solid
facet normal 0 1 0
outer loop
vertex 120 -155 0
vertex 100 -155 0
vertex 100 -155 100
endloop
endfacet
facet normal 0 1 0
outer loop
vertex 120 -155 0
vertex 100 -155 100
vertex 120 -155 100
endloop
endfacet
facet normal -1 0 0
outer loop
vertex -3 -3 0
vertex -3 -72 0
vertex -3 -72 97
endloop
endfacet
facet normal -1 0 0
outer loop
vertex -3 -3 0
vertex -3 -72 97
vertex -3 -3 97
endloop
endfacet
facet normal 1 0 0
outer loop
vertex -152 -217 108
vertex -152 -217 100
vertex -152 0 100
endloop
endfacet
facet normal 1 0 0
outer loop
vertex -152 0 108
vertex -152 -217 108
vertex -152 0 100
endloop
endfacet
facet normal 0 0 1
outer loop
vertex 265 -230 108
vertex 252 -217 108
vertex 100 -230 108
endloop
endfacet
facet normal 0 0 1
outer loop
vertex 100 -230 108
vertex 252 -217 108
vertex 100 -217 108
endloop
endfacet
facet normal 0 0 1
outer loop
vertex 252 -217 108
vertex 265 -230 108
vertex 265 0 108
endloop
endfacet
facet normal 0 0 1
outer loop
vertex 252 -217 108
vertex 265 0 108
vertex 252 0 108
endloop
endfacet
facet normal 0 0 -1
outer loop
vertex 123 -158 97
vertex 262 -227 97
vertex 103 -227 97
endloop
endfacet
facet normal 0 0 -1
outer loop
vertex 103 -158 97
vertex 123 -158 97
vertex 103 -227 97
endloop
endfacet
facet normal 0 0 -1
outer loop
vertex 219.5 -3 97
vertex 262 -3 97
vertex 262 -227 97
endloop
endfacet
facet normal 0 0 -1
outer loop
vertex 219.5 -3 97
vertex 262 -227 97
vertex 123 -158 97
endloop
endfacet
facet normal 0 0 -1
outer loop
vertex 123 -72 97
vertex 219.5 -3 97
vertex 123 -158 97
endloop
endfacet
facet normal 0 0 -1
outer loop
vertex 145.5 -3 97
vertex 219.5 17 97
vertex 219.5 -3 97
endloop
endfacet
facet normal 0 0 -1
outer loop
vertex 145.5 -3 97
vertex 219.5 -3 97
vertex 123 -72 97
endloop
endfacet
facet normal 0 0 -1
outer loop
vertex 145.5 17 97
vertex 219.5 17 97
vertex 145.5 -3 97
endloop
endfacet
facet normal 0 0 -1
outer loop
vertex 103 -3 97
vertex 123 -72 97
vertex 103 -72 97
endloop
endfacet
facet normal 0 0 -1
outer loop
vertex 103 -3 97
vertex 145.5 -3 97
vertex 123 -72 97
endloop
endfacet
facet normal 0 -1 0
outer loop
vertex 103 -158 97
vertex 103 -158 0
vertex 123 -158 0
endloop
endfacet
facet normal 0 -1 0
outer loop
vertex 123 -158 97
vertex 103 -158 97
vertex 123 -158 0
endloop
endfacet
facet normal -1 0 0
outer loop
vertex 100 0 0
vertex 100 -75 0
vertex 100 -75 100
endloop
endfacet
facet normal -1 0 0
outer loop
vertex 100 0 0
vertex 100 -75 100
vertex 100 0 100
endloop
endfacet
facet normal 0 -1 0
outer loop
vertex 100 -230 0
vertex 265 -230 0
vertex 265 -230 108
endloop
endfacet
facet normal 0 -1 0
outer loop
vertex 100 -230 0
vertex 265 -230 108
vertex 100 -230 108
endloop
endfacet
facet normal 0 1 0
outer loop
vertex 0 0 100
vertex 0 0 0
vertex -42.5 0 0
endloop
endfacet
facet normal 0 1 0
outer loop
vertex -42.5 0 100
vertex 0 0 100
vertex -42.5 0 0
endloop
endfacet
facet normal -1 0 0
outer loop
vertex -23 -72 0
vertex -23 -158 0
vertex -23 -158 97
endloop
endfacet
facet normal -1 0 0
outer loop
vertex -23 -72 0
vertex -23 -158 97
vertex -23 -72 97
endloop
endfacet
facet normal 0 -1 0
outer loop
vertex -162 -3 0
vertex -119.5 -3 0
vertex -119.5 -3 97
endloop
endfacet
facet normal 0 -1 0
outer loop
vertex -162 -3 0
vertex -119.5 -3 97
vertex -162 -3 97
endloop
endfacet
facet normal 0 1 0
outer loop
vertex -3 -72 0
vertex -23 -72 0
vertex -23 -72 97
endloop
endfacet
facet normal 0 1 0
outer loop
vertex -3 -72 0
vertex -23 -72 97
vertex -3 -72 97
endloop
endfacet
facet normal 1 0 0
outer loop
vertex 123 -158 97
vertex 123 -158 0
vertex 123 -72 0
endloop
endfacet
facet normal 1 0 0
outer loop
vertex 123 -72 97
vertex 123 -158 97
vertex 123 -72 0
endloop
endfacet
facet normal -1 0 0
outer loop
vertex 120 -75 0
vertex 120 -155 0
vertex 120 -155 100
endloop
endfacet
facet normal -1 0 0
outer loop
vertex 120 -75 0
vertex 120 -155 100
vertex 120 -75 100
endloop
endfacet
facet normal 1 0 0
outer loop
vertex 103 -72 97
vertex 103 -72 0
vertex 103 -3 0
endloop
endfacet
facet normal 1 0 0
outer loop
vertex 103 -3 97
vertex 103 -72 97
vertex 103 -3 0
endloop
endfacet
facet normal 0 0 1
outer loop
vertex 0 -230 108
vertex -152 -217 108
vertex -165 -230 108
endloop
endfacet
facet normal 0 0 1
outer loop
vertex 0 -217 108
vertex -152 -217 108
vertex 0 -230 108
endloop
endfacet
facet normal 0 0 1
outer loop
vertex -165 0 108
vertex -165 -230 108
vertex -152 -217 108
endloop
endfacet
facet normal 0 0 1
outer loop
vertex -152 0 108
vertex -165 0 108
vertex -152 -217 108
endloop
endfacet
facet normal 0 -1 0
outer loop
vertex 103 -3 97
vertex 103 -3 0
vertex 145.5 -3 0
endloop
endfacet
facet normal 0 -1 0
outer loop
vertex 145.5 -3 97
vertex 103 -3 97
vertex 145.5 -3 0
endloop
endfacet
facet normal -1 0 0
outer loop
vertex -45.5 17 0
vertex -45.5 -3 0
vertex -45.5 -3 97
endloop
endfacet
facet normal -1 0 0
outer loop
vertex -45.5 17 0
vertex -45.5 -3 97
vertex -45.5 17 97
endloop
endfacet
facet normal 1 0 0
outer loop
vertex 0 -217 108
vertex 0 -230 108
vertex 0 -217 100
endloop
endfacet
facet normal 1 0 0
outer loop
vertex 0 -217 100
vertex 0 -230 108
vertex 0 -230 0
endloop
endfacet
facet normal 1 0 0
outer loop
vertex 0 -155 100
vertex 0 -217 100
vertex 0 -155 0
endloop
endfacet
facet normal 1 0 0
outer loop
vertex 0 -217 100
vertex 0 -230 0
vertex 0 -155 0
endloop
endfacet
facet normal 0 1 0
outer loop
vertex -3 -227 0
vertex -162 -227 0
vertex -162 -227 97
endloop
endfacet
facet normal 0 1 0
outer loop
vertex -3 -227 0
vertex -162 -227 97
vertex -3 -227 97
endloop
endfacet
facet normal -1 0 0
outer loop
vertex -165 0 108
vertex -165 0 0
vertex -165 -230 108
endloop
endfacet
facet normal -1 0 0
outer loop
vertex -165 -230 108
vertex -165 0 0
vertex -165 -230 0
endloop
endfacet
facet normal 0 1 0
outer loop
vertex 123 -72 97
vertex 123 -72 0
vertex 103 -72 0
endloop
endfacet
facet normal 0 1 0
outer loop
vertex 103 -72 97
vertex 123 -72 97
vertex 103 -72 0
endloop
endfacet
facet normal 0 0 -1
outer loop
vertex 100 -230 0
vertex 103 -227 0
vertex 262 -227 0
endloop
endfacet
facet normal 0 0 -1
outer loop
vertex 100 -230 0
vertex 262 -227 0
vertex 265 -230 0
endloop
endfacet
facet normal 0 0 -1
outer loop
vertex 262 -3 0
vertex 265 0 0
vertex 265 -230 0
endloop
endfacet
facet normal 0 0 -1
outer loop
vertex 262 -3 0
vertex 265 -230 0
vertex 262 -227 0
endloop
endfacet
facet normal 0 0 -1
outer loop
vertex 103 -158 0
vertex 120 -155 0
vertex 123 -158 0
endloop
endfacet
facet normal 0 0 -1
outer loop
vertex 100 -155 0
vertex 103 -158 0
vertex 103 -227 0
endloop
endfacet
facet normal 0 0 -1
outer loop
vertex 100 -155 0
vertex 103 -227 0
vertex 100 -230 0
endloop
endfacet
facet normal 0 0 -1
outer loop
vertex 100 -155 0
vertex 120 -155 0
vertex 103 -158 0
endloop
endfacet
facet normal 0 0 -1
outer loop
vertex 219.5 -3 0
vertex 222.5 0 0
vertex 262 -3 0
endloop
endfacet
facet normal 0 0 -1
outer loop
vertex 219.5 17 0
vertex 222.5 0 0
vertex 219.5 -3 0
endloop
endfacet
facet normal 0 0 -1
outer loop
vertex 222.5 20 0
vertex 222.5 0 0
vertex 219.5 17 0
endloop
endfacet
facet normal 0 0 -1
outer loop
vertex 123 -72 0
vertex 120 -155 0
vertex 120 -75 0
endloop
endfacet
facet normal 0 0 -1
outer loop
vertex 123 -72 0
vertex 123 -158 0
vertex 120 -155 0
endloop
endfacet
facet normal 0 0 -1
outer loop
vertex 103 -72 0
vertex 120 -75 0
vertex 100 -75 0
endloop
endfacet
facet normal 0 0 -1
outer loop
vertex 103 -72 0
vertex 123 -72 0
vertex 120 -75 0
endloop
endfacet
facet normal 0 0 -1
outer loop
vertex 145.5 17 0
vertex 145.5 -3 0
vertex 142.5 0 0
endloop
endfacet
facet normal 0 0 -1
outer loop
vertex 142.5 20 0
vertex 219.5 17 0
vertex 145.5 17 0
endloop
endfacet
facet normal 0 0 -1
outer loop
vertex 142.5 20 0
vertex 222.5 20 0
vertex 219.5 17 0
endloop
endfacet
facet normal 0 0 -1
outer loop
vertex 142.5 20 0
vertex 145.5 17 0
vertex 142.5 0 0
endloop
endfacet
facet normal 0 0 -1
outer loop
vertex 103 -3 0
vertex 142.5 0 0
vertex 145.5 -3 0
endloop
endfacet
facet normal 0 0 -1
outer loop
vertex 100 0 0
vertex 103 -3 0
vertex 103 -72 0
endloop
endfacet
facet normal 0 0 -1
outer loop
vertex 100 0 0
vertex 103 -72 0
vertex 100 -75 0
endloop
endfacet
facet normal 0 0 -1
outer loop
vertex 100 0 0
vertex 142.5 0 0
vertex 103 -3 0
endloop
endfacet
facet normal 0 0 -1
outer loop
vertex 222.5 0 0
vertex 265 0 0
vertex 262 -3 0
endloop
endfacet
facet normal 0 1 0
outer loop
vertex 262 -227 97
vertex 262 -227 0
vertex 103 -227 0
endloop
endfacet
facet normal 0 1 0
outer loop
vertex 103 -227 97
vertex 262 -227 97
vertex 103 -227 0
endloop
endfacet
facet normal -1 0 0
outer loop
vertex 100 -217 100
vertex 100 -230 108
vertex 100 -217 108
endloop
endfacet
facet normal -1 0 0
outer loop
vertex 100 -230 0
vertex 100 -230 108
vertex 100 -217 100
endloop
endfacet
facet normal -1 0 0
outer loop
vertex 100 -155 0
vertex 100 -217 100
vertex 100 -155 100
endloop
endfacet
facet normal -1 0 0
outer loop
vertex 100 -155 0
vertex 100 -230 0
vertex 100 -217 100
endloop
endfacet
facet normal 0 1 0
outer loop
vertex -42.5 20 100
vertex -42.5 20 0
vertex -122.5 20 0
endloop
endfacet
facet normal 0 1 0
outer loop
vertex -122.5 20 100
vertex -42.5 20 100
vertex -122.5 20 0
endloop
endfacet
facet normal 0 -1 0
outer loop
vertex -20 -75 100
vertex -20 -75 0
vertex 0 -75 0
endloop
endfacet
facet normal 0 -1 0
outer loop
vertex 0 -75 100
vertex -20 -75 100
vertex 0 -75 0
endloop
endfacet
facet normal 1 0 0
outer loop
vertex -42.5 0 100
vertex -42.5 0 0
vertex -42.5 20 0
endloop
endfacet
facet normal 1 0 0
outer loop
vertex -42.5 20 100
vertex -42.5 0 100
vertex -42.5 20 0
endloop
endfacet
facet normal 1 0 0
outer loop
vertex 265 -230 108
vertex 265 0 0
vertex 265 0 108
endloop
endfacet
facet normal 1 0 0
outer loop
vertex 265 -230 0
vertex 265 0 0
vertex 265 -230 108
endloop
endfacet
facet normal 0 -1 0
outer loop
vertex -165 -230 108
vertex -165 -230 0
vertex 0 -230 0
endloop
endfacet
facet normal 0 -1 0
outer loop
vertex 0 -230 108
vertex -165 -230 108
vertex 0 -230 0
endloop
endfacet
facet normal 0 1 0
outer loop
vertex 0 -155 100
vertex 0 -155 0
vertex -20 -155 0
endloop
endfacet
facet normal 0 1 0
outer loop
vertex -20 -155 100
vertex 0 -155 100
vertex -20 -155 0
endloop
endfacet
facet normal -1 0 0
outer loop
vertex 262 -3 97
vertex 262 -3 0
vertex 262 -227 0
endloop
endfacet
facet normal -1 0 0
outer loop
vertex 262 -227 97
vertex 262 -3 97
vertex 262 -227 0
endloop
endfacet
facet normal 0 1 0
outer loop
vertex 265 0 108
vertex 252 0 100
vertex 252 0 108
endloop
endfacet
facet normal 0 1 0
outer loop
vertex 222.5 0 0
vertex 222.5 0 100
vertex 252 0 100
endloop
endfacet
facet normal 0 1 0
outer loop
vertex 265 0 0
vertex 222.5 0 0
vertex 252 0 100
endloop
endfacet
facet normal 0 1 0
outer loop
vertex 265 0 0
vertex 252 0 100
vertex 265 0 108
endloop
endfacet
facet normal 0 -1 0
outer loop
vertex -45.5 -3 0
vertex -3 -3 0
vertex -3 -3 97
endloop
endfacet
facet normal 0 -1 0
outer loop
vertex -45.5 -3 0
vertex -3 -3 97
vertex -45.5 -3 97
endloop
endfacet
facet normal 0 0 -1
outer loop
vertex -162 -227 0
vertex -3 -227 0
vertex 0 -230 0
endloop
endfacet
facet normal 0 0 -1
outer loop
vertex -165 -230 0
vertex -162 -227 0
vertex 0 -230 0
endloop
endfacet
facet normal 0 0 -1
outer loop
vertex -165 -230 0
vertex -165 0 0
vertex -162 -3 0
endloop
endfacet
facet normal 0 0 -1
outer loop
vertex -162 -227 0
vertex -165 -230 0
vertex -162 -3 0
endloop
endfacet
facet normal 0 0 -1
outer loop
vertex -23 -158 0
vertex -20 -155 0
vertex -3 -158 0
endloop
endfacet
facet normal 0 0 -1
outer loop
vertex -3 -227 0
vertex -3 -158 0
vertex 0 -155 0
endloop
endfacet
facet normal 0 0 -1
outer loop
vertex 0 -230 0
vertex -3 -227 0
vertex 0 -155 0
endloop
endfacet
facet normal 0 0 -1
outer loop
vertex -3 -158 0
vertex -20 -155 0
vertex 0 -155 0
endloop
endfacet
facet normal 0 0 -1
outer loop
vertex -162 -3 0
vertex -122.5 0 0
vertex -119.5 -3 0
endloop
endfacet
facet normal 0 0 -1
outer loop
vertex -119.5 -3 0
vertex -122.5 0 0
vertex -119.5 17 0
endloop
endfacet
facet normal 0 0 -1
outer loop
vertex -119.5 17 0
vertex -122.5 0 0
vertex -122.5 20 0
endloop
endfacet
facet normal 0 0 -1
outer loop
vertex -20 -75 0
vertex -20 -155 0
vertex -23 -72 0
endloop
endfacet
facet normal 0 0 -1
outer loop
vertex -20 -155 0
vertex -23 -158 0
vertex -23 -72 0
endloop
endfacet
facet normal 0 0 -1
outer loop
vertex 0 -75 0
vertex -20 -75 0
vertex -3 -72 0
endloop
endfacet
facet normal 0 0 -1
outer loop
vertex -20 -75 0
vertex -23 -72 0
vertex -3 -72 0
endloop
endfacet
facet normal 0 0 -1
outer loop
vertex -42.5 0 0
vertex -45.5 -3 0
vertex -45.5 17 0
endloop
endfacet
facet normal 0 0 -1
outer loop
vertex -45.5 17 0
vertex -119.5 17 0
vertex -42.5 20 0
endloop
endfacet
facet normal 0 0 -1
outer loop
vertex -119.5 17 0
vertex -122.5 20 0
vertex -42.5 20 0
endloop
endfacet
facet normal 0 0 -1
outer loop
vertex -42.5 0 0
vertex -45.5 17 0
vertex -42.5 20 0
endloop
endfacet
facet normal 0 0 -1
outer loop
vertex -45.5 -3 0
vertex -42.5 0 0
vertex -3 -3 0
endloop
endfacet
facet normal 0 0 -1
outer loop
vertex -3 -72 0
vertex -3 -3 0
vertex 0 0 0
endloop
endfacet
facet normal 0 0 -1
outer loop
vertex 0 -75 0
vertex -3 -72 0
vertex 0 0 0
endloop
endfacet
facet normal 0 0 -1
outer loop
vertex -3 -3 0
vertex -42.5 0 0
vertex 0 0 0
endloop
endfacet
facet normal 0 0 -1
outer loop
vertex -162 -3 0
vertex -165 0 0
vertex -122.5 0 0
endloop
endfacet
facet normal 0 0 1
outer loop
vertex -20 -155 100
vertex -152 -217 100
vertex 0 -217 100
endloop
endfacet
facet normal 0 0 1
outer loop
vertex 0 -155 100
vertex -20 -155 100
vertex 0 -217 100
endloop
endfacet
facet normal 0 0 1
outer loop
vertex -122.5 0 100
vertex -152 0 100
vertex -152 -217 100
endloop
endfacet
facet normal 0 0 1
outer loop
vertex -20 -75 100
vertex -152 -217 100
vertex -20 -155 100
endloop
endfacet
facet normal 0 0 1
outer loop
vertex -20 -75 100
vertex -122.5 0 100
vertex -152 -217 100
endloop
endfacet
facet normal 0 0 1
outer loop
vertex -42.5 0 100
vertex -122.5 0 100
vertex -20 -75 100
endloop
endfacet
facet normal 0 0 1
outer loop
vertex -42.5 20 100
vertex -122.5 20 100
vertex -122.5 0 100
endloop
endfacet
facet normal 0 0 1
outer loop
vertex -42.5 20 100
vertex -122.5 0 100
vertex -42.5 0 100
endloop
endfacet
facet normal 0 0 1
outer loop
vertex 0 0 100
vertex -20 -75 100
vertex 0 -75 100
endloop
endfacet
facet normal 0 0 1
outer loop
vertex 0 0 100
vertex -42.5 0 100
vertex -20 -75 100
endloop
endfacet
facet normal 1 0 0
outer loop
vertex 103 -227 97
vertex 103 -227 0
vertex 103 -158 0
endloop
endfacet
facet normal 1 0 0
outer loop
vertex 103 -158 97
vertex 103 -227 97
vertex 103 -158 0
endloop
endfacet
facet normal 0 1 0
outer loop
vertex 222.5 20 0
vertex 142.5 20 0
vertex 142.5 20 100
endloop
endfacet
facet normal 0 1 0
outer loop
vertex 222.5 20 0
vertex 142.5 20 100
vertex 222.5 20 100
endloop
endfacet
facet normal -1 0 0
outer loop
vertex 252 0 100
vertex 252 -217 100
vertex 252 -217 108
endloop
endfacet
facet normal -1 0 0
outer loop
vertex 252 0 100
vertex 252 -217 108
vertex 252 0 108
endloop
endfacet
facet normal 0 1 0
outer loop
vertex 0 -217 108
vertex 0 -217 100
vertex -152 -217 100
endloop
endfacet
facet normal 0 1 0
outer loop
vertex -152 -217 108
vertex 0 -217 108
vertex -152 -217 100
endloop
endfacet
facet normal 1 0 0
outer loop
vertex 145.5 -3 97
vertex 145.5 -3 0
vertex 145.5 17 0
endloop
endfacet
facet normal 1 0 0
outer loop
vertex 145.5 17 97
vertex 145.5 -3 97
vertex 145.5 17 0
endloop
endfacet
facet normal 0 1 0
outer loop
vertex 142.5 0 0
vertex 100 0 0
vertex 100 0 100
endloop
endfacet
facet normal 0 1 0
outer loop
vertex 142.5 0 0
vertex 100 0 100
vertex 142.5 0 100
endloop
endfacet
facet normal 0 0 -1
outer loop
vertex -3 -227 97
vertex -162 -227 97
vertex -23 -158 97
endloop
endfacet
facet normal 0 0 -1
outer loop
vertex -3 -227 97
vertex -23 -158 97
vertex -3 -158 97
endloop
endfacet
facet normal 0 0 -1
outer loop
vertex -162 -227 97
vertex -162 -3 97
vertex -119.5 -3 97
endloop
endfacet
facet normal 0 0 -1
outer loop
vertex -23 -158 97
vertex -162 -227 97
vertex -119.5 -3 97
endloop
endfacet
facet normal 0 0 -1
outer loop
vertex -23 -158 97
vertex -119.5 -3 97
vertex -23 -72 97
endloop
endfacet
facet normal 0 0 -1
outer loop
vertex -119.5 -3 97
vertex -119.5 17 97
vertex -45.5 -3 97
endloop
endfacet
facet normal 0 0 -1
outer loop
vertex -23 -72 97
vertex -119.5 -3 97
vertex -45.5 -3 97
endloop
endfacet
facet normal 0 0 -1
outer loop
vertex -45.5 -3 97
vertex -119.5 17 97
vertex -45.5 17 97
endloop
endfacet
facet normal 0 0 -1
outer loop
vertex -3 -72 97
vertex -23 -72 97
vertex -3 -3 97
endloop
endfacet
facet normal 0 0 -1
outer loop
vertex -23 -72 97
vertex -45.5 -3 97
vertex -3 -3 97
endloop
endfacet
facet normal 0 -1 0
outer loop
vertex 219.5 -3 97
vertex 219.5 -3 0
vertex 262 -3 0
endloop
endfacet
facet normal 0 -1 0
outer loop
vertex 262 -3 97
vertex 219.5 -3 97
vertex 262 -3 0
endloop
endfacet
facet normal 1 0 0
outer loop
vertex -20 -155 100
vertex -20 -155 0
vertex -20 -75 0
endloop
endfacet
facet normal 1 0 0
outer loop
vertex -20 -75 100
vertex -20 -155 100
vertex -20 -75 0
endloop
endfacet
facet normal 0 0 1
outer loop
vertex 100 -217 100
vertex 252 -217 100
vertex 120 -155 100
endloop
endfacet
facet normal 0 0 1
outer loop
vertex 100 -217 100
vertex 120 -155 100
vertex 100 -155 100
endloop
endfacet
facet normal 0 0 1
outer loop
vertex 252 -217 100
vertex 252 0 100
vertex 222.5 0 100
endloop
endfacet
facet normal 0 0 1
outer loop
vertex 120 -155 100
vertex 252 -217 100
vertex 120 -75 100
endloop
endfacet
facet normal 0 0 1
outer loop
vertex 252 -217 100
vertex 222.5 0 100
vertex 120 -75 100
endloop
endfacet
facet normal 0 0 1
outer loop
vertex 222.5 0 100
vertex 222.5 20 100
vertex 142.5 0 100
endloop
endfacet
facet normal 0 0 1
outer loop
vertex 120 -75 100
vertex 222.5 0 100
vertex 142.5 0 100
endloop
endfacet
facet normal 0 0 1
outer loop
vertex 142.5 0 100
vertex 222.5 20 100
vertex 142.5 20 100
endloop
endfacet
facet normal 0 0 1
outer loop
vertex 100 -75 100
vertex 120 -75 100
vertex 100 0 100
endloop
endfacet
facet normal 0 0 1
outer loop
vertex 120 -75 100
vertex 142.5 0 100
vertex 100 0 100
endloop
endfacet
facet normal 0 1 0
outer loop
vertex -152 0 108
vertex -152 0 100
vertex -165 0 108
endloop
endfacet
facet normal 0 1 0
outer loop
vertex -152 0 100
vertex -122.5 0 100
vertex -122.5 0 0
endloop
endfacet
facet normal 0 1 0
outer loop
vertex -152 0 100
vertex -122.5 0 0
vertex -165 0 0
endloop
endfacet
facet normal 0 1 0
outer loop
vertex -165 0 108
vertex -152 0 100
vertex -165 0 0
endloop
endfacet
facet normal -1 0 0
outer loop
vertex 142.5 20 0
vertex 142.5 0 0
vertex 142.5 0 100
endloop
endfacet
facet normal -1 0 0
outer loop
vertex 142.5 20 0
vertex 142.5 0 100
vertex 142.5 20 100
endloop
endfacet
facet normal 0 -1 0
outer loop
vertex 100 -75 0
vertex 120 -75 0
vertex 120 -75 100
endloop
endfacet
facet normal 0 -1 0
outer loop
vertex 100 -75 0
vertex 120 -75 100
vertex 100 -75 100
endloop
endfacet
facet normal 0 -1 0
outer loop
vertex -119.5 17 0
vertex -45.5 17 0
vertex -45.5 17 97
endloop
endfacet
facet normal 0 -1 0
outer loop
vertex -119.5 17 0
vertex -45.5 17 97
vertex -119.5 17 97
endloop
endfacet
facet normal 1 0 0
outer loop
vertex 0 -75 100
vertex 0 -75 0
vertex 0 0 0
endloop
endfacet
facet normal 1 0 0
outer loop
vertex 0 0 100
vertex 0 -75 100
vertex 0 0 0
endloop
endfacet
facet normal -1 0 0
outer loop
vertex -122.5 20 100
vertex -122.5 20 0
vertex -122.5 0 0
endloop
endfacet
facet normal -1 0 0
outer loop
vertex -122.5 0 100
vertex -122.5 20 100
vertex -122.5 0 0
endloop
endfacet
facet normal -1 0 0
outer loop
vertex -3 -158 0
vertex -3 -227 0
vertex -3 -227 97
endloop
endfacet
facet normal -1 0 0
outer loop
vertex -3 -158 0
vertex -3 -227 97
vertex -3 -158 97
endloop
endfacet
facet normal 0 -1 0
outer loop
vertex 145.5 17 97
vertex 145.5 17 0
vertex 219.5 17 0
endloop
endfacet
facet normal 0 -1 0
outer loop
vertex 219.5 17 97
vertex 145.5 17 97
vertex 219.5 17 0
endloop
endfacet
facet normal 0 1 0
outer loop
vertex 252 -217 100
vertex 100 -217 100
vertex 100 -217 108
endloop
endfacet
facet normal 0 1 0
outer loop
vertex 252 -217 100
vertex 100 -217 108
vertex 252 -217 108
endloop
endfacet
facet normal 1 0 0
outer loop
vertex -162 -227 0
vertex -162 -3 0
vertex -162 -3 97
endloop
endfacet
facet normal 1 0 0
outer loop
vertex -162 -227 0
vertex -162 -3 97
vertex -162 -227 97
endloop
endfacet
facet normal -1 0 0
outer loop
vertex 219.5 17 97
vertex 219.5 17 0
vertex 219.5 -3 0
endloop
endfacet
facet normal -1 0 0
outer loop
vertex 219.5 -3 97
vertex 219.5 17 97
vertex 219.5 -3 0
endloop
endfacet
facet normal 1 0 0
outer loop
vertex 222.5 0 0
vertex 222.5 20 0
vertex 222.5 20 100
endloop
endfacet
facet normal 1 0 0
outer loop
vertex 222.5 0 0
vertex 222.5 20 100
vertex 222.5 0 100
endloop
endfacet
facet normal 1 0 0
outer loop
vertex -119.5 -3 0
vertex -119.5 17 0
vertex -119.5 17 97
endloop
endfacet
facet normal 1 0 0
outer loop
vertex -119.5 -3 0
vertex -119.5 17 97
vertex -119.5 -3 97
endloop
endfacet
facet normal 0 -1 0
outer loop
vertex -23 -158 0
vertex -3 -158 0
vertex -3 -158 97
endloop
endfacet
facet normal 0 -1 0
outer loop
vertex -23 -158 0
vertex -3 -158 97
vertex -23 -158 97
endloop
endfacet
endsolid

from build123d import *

# Parameters (mm, degrees)
F2_DEPTH = 100
F4_DEPTH = 3
F6_DEPTH = 8
F9_DEPTH = 100


with BuildPart() as f2:
    # F1 (on Top) → F2 (new body)
    with BuildSketch(Plane.XY):
        Polygon((0, -75), (0, 0), (-42.5, 0), (-42.5, 20), (-122.5, 20), (-122.5, 0), (-165, 0), (-165, -230), (0, -230), (0, -155), (-20, -155), (-20, -75), align=None)
        Polygon((-162.949994, -2.050006), (-120.449994, -2.050006), (-120.449994, 17.949994), (-44.550006, 17.949994), (-44.550006, -2.050006), (-2.050006, -2.050006), (-2.050006, -72.949994), (-22.050006, -72.949994), (-22.050006, -157.050006), (-2.050006, -157.050006), (-2.050006, -227.949994), (-162.949994, -227.949994), align=None, mode=Mode.SUBTRACT)
    extrude(amount=F2_DEPTH)

    # F3 (on face) → F4 (join)
    with BuildSketch(Plane.XY.offset(100)):
        Polygon((-165, 0), (-165, -230), (0, -230), (0, -155), (-20, -155), (-20, -75), (0, -75), (0, 0), (-42.5, 0), (-42.5, 20), (-122.5, 20), (-122.5, 0), align=None)
    extrude(amount=-F4_DEPTH)

    # F5 (on face) → F6 (join)
    with BuildSketch(Plane.XY.offset(100)):
        Polygon((-152, -230), (0, -230), (0, -217), (-152, -217), (-152, 0), (-165, 0), (-165, -230), (-160, -230), align=None)
    extrude(amount=F6_DEPTH)

    # F7 (on face) → F9 (join)
    with BuildSketch(Plane(origin=(0, 0, 0), x_dir=(1, 0, 0), z_dir=(0, 0, -1))):
        Polygon((-165, 230), (-165, 0), (-122.5, 0), (-122.5, -20), (-42.5, -20), (-42.5, 0), (0, 0), (0, 75), (-20, 75), (-20, 155), (0, 155), (0, 230), align=None)
        Polygon((-162, 3), (-162, 227), (-3, 227), (-3, 158), (-23, 158), (-23, 72), (-3, 72), (-3, 3), (-45.5, 3), (-45.5, -17), (-119.5, -17), (-119.5, 3), align=None, mode=Mode.SUBTRACT)
    extrude(amount=-F9_DEPTH)


with BuildPart() as f10_1:
    # F10: instance of F2
    add(f2.part.mirror(Plane.YZ.offset(50)))


solid = Compound([f2.part, f10_1.part])
